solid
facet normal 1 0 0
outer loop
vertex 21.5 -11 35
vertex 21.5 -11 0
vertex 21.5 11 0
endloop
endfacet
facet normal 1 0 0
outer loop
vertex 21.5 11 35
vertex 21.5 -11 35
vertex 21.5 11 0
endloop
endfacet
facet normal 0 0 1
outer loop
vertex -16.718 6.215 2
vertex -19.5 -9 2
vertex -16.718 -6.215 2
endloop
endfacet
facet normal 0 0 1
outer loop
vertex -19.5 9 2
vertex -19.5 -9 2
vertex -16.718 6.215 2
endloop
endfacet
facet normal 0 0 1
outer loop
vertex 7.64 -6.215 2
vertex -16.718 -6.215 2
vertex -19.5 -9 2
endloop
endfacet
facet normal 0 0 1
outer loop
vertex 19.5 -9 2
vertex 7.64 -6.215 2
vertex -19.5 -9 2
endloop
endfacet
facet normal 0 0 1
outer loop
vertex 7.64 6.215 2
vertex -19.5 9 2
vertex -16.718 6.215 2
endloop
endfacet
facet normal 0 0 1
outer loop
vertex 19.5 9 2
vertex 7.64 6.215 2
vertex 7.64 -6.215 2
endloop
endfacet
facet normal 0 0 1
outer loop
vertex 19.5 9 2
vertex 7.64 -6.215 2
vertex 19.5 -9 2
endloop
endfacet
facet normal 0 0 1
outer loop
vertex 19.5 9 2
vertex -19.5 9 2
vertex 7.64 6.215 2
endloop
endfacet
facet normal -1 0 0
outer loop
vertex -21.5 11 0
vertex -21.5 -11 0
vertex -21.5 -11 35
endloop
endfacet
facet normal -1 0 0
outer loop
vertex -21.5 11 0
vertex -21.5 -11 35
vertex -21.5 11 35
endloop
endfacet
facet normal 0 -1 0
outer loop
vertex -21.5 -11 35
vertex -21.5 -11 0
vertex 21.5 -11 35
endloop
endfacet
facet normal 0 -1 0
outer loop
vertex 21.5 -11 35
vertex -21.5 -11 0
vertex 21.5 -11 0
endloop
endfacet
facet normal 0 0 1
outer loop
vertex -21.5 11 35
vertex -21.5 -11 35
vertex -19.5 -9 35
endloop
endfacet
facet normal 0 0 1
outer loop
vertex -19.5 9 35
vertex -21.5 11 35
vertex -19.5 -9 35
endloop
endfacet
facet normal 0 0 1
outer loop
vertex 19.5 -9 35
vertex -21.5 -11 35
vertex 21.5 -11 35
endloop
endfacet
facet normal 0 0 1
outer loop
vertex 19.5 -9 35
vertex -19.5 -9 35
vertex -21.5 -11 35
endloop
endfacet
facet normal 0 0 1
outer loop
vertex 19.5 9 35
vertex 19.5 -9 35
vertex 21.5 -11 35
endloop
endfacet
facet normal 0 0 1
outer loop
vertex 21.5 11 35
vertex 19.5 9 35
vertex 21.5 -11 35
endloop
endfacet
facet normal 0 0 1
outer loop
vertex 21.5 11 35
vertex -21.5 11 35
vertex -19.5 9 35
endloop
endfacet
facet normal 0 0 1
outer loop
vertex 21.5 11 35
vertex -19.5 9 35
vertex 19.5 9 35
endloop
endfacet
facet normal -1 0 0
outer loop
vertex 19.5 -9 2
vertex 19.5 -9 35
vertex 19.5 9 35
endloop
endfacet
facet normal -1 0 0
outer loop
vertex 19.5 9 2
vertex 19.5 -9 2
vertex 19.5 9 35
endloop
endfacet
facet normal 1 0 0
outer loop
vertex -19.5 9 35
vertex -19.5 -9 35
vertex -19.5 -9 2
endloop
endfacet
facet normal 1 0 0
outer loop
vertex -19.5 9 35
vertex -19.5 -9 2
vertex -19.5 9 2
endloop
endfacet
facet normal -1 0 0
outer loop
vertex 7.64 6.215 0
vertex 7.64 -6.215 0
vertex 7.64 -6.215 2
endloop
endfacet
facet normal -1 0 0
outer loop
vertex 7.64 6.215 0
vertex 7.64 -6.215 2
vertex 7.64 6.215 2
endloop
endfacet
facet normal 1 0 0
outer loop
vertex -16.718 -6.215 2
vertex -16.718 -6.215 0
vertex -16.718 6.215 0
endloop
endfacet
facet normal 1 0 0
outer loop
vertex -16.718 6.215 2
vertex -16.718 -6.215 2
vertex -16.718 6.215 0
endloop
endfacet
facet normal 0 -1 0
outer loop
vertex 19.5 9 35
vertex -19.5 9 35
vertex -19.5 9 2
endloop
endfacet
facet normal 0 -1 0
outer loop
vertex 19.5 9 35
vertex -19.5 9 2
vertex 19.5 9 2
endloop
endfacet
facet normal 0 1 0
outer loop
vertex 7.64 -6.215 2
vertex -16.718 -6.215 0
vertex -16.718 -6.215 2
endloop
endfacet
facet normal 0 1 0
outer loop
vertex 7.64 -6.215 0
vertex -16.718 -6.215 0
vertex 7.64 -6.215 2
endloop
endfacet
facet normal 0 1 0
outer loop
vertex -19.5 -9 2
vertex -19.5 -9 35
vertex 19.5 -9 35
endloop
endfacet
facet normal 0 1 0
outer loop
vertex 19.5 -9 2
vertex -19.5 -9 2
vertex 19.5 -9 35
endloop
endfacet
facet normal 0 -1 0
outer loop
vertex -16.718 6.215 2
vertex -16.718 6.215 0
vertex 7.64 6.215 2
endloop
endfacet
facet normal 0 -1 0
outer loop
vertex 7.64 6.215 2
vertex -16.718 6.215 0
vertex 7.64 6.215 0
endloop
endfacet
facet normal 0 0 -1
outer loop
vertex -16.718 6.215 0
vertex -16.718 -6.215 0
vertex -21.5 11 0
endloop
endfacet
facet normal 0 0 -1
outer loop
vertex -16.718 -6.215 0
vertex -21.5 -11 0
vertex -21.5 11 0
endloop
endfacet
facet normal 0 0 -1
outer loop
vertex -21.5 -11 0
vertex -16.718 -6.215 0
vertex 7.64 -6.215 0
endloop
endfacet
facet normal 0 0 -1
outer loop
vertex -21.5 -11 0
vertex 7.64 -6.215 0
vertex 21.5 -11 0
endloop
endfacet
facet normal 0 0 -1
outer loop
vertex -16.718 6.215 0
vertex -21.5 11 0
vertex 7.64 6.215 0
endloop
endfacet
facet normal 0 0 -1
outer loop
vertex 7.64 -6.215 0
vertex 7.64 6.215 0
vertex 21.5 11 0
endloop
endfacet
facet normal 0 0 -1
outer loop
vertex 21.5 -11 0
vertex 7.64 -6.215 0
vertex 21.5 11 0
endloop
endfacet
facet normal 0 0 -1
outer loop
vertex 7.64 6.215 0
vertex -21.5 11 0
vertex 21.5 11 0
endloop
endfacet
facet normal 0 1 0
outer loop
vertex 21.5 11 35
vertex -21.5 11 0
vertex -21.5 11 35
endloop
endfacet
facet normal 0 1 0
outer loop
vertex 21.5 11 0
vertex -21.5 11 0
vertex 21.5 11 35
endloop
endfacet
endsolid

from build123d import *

# Parameters (mm, degrees)
F0_W     = 43
F0_H     = 22
F1_DEPTH = 35
F2_W     = 39
F2_H     = 18
F3_DEPTH = 33
F4_W     = 24.357798
F4_H     = 12.429554
F5_DEPTH = 25


with BuildPart() as f1:
    # F0 (on Top) → F1 (new body)
    with BuildSketch(Plane.XY):
        Rectangle(F0_W, F0_H)
    extrude(amount=F1_DEPTH)

    # F2 (on face) → F3 (cut)
    with BuildSketch(Plane.XY.offset(35)):
        Rectangle(F2_W, F2_H)
    extrude(amount=-F3_DEPTH, mode=Mode.SUBTRACT)

    # F4 (on Top) → F5 (cut)
    with BuildSketch(Plane.XY):
        with Locations((-4.539045, 0)):
            Rectangle(F4_W, F4_H)
    extrude(amount=F5_DEPTH, mode=Mode.SUBTRACT)


solid = f1.part
